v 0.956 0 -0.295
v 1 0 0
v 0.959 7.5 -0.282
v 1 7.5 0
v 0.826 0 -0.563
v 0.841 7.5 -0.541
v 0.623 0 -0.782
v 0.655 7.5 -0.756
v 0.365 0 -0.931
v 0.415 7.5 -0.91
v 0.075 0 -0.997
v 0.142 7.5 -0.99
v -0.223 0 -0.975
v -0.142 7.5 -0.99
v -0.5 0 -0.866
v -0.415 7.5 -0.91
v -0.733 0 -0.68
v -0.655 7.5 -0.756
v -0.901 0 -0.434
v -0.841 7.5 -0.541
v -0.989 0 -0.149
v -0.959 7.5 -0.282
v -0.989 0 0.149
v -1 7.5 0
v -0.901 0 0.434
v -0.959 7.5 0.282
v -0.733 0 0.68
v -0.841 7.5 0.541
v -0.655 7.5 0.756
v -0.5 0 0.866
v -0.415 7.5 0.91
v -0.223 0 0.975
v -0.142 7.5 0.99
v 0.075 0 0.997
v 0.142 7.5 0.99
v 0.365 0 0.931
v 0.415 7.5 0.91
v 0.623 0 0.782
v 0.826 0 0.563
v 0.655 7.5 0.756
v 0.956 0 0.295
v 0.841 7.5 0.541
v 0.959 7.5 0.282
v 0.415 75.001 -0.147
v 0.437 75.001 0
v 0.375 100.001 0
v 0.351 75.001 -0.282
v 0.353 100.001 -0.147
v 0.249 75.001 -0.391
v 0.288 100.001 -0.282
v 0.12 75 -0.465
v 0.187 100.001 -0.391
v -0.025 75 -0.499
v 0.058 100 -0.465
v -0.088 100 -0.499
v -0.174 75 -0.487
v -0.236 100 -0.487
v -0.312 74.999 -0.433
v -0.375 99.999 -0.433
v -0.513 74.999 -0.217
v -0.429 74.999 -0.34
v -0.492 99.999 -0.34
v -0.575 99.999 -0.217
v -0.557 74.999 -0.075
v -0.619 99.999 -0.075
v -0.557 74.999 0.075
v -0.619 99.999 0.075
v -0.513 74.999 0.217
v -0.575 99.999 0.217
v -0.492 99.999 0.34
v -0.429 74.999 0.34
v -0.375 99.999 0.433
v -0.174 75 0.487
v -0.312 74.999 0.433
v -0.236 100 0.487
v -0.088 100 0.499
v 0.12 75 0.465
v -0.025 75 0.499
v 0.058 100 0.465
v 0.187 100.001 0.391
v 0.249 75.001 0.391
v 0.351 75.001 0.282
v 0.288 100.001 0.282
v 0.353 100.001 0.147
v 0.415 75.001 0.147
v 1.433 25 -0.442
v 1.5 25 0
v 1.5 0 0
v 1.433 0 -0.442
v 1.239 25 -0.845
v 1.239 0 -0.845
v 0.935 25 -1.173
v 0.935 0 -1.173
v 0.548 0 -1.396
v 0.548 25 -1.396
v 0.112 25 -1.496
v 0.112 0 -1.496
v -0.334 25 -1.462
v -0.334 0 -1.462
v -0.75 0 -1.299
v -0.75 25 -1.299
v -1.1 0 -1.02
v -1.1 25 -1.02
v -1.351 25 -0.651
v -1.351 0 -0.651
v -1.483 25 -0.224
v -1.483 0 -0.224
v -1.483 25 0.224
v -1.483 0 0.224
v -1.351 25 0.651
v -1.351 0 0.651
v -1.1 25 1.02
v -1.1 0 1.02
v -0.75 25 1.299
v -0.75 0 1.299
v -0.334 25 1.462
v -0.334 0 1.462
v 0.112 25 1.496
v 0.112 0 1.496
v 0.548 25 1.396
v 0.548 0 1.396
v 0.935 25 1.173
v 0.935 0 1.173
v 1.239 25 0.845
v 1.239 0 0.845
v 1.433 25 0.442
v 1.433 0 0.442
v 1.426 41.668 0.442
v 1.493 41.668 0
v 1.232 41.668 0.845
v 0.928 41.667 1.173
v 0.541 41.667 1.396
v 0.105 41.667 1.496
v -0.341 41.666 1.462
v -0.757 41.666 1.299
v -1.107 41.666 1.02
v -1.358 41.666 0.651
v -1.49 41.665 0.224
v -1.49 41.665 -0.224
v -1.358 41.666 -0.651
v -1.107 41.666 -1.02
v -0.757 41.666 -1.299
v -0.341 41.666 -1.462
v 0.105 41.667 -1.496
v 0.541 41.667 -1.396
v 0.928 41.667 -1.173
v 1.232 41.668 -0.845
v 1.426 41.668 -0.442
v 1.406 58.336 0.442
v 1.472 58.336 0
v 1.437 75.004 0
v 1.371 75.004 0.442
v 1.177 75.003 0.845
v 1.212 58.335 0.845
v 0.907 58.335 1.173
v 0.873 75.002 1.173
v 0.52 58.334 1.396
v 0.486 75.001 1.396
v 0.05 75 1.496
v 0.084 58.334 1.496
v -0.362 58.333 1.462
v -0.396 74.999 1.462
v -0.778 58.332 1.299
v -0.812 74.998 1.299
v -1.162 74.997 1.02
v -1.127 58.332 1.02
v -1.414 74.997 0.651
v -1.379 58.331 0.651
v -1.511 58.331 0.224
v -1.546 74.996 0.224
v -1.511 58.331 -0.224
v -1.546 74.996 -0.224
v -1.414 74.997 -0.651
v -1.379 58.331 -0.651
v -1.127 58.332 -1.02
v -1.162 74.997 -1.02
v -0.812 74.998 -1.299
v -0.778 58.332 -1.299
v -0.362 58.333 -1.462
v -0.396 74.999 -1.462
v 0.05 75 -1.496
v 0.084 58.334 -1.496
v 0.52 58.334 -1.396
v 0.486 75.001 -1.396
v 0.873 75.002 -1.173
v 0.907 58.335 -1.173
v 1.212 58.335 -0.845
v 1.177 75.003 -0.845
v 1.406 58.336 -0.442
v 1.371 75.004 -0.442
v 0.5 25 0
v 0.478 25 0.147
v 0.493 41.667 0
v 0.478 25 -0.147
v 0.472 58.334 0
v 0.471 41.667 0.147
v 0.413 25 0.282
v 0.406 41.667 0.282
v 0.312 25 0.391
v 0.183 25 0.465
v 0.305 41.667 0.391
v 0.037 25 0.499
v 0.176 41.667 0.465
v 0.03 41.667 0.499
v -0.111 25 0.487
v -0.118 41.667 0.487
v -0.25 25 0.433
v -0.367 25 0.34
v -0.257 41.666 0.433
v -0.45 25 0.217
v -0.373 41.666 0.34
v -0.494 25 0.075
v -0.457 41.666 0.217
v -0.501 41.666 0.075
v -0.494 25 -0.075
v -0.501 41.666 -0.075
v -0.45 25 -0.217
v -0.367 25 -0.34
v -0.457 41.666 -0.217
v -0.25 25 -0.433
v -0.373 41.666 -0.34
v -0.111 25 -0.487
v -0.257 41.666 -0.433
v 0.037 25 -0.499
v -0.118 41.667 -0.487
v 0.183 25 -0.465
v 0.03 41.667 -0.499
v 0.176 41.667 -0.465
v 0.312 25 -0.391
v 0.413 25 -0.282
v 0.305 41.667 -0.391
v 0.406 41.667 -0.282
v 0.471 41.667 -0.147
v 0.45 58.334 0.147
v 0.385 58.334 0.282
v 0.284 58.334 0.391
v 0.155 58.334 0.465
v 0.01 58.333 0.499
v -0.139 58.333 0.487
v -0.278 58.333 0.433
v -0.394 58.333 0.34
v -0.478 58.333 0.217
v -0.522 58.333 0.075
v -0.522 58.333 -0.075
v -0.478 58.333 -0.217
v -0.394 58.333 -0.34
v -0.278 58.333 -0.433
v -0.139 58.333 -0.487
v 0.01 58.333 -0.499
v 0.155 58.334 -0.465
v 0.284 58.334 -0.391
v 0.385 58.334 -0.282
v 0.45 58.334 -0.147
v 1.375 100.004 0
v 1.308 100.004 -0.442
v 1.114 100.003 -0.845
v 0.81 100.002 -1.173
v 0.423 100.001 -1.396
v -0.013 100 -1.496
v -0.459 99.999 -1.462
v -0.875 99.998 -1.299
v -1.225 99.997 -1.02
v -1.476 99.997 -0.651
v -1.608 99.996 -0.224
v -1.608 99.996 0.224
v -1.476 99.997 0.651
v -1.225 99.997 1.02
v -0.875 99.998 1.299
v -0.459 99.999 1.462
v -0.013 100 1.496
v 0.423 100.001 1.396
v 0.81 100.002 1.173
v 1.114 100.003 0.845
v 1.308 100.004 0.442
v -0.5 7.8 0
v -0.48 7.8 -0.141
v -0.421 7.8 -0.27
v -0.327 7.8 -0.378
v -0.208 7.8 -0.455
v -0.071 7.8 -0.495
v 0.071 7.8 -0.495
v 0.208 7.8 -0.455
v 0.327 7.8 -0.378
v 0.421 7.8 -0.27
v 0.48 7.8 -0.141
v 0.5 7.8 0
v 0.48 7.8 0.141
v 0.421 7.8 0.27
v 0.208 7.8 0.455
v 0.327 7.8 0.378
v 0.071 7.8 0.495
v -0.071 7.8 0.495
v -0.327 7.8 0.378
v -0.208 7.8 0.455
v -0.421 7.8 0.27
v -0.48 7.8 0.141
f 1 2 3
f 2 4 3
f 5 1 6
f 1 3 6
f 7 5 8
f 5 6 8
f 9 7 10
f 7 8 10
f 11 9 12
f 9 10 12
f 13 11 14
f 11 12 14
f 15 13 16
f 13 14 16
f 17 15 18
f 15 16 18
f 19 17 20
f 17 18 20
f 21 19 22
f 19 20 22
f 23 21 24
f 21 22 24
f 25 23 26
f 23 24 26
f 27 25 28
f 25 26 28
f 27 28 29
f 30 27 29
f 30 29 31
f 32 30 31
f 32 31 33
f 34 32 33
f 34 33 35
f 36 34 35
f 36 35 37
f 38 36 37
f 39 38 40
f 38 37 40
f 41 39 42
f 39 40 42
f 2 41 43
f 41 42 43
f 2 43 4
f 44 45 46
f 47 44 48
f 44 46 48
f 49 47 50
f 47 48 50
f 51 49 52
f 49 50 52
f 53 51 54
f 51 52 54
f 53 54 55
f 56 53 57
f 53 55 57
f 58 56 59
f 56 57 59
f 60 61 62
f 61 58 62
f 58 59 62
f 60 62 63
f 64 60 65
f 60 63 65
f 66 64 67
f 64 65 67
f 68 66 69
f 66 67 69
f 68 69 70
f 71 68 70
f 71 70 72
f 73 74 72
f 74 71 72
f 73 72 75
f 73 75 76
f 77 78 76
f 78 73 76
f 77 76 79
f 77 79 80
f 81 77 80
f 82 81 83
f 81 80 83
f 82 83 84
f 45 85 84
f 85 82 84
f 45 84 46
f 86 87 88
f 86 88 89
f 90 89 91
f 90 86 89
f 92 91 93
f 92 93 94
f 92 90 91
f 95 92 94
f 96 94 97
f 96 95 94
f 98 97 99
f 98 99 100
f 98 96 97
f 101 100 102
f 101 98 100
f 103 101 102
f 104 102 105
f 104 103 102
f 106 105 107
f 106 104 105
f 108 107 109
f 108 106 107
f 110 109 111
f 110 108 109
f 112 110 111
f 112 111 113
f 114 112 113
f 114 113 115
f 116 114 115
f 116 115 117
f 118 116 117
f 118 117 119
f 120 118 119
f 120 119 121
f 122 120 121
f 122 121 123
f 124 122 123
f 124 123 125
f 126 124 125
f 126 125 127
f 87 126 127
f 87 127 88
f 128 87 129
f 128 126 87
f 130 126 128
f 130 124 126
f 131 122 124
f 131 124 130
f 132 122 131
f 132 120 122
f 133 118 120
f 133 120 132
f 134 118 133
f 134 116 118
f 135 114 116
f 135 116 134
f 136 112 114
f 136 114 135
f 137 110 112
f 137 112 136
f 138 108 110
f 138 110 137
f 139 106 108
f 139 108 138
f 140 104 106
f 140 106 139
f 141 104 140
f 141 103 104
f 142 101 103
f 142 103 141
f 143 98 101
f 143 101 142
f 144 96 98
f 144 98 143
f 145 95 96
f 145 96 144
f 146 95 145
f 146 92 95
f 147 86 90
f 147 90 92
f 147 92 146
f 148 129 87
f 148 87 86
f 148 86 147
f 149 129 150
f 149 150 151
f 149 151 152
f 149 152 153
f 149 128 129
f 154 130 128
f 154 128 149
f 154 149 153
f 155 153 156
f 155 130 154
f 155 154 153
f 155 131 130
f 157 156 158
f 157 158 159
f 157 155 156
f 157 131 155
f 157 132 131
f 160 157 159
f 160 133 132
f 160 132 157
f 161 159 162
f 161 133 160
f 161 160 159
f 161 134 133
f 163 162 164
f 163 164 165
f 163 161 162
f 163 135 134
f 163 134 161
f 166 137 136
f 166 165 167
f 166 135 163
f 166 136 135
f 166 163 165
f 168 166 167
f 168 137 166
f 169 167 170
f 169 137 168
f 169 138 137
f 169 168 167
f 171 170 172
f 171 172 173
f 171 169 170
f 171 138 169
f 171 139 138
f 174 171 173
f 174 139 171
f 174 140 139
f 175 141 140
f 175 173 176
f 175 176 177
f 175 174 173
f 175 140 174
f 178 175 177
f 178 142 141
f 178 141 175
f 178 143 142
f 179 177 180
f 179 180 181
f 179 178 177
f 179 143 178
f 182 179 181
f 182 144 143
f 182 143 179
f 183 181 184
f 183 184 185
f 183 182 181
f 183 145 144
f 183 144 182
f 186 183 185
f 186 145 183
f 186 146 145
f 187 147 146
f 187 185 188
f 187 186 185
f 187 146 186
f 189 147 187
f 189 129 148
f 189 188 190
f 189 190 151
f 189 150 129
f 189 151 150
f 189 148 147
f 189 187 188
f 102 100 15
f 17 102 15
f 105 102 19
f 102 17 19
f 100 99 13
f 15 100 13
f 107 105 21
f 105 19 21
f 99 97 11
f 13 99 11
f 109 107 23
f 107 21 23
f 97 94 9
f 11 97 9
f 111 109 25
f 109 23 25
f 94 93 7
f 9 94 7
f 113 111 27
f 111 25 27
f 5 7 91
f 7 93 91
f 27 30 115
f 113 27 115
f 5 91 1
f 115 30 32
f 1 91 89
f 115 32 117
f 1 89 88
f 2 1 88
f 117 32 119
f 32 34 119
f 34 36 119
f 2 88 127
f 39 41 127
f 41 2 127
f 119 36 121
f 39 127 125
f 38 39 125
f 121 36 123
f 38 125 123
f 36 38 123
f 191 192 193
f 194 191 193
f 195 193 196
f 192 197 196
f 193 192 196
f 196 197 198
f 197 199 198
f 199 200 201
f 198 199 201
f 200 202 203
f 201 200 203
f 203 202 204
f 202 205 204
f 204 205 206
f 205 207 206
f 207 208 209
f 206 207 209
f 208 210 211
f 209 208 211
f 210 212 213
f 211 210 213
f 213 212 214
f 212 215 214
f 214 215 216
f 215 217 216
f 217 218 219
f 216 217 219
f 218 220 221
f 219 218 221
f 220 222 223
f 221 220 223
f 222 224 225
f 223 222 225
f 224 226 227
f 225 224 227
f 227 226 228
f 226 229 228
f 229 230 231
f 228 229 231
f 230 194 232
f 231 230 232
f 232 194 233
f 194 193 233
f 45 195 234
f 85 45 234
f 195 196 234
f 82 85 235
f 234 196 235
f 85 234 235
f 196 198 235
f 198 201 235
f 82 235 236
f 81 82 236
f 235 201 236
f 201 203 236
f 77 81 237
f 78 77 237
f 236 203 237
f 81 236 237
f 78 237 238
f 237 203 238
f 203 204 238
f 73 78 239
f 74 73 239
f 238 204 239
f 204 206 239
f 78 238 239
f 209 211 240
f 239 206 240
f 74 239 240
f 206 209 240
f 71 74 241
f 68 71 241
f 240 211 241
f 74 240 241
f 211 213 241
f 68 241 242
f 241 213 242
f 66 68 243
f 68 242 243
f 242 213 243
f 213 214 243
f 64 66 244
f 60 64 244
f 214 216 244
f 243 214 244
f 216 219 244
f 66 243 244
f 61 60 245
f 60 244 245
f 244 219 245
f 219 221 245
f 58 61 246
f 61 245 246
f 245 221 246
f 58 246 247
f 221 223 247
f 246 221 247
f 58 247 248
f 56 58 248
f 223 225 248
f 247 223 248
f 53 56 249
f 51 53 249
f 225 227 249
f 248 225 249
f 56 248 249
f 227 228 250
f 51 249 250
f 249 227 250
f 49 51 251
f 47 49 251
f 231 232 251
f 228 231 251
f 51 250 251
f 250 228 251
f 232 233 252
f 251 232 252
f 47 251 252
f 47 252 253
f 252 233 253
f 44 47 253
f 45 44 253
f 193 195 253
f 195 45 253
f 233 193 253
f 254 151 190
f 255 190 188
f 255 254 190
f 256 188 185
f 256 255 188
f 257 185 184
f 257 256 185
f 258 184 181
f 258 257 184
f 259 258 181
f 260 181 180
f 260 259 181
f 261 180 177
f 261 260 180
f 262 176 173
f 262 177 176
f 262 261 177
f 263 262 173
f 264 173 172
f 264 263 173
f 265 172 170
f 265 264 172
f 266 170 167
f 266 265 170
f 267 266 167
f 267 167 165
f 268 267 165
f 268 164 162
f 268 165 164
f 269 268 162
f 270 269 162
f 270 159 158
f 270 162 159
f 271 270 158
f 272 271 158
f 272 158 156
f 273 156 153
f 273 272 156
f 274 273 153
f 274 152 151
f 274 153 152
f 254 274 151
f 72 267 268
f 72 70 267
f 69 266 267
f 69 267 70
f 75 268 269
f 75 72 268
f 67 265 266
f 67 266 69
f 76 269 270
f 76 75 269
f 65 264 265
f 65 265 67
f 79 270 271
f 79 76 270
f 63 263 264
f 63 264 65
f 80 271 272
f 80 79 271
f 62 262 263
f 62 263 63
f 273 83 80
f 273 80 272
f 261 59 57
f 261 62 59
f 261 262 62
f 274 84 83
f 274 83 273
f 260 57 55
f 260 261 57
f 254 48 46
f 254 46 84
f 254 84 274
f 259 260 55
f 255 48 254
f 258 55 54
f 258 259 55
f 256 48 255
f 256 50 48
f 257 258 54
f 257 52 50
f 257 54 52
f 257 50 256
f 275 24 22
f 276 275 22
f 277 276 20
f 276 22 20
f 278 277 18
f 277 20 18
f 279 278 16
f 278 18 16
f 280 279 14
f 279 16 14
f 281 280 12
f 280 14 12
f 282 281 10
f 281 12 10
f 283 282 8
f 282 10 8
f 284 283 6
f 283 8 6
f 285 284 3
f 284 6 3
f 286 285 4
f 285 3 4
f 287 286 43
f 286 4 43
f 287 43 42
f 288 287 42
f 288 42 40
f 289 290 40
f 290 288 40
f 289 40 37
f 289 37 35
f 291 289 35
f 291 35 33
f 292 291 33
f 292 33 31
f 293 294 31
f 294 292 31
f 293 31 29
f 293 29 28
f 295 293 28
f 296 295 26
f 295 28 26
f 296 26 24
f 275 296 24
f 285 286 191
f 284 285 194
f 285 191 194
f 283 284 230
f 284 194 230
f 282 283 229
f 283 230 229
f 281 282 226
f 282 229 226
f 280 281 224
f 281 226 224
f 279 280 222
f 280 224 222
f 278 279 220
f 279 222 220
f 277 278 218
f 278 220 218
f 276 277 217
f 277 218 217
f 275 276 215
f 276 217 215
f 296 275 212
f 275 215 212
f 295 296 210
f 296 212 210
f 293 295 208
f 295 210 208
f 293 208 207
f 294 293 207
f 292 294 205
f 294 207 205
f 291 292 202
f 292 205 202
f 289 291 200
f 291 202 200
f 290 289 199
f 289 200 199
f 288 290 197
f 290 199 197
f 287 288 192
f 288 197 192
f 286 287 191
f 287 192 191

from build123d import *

# Parameters (mm, degrees)
SKETCH1_R                 = 1.5
SKETCH1_R_2               = 0.5
F_2_0MM_DOWEL_HOLE1_D     = 2
F_2_0MM_DOWEL_HOLE1_DEPTH = 7.5
F_2_0MM_DOWEL_HOLE1_TIP   = 0.600860619


with BuildPart() as part:
    # Sweep1: sweep along a path in Sketch2
    with BuildLine(Plane.XY) as sweep1_path:
        Line((0, 0), (0, 25))
        ThreePointArc((0, 25), (-0.015624988, 50.000019531), (-0.062499927, 75))
        Line((-0.062499927, 75), (-0.124999951, 100))
    # Sketch1 → Sweep1 (sweep)
    with BuildSketch(Plane(origin=(0, 0, 0), x_dir=(1, 0, 0), z_dir=(0, 1, 0))):
        Circle(SKETCH1_R)
        Circle(SKETCH1_R_2, mode=Mode.SUBTRACT)
    sweep(path=sweep1_path.line)

    # Ø2.0mm Dowel Hole1
    with Locations(Plane(origin=(0, 0, 0), x_dir=(-1, 0, 0), z_dir=(0, -1, 0))):
        with Locations((0, 0)):
            Hole(F_2_0MM_DOWEL_HOLE1_D / 2, depth=F_2_0MM_DOWEL_HOLE1_DEPTH)
            with Locations((0, 0, -(F_2_0MM_DOWEL_HOLE1_DEPTH + F_2_0MM_DOWEL_HOLE1_TIP / 2))):  # 118° drill point
                Cone(0, F_2_0MM_DOWEL_HOLE1_D / 2, F_2_0MM_DOWEL_HOLE1_TIP, mode=Mode.SUBTRACT)


solid = part.part
